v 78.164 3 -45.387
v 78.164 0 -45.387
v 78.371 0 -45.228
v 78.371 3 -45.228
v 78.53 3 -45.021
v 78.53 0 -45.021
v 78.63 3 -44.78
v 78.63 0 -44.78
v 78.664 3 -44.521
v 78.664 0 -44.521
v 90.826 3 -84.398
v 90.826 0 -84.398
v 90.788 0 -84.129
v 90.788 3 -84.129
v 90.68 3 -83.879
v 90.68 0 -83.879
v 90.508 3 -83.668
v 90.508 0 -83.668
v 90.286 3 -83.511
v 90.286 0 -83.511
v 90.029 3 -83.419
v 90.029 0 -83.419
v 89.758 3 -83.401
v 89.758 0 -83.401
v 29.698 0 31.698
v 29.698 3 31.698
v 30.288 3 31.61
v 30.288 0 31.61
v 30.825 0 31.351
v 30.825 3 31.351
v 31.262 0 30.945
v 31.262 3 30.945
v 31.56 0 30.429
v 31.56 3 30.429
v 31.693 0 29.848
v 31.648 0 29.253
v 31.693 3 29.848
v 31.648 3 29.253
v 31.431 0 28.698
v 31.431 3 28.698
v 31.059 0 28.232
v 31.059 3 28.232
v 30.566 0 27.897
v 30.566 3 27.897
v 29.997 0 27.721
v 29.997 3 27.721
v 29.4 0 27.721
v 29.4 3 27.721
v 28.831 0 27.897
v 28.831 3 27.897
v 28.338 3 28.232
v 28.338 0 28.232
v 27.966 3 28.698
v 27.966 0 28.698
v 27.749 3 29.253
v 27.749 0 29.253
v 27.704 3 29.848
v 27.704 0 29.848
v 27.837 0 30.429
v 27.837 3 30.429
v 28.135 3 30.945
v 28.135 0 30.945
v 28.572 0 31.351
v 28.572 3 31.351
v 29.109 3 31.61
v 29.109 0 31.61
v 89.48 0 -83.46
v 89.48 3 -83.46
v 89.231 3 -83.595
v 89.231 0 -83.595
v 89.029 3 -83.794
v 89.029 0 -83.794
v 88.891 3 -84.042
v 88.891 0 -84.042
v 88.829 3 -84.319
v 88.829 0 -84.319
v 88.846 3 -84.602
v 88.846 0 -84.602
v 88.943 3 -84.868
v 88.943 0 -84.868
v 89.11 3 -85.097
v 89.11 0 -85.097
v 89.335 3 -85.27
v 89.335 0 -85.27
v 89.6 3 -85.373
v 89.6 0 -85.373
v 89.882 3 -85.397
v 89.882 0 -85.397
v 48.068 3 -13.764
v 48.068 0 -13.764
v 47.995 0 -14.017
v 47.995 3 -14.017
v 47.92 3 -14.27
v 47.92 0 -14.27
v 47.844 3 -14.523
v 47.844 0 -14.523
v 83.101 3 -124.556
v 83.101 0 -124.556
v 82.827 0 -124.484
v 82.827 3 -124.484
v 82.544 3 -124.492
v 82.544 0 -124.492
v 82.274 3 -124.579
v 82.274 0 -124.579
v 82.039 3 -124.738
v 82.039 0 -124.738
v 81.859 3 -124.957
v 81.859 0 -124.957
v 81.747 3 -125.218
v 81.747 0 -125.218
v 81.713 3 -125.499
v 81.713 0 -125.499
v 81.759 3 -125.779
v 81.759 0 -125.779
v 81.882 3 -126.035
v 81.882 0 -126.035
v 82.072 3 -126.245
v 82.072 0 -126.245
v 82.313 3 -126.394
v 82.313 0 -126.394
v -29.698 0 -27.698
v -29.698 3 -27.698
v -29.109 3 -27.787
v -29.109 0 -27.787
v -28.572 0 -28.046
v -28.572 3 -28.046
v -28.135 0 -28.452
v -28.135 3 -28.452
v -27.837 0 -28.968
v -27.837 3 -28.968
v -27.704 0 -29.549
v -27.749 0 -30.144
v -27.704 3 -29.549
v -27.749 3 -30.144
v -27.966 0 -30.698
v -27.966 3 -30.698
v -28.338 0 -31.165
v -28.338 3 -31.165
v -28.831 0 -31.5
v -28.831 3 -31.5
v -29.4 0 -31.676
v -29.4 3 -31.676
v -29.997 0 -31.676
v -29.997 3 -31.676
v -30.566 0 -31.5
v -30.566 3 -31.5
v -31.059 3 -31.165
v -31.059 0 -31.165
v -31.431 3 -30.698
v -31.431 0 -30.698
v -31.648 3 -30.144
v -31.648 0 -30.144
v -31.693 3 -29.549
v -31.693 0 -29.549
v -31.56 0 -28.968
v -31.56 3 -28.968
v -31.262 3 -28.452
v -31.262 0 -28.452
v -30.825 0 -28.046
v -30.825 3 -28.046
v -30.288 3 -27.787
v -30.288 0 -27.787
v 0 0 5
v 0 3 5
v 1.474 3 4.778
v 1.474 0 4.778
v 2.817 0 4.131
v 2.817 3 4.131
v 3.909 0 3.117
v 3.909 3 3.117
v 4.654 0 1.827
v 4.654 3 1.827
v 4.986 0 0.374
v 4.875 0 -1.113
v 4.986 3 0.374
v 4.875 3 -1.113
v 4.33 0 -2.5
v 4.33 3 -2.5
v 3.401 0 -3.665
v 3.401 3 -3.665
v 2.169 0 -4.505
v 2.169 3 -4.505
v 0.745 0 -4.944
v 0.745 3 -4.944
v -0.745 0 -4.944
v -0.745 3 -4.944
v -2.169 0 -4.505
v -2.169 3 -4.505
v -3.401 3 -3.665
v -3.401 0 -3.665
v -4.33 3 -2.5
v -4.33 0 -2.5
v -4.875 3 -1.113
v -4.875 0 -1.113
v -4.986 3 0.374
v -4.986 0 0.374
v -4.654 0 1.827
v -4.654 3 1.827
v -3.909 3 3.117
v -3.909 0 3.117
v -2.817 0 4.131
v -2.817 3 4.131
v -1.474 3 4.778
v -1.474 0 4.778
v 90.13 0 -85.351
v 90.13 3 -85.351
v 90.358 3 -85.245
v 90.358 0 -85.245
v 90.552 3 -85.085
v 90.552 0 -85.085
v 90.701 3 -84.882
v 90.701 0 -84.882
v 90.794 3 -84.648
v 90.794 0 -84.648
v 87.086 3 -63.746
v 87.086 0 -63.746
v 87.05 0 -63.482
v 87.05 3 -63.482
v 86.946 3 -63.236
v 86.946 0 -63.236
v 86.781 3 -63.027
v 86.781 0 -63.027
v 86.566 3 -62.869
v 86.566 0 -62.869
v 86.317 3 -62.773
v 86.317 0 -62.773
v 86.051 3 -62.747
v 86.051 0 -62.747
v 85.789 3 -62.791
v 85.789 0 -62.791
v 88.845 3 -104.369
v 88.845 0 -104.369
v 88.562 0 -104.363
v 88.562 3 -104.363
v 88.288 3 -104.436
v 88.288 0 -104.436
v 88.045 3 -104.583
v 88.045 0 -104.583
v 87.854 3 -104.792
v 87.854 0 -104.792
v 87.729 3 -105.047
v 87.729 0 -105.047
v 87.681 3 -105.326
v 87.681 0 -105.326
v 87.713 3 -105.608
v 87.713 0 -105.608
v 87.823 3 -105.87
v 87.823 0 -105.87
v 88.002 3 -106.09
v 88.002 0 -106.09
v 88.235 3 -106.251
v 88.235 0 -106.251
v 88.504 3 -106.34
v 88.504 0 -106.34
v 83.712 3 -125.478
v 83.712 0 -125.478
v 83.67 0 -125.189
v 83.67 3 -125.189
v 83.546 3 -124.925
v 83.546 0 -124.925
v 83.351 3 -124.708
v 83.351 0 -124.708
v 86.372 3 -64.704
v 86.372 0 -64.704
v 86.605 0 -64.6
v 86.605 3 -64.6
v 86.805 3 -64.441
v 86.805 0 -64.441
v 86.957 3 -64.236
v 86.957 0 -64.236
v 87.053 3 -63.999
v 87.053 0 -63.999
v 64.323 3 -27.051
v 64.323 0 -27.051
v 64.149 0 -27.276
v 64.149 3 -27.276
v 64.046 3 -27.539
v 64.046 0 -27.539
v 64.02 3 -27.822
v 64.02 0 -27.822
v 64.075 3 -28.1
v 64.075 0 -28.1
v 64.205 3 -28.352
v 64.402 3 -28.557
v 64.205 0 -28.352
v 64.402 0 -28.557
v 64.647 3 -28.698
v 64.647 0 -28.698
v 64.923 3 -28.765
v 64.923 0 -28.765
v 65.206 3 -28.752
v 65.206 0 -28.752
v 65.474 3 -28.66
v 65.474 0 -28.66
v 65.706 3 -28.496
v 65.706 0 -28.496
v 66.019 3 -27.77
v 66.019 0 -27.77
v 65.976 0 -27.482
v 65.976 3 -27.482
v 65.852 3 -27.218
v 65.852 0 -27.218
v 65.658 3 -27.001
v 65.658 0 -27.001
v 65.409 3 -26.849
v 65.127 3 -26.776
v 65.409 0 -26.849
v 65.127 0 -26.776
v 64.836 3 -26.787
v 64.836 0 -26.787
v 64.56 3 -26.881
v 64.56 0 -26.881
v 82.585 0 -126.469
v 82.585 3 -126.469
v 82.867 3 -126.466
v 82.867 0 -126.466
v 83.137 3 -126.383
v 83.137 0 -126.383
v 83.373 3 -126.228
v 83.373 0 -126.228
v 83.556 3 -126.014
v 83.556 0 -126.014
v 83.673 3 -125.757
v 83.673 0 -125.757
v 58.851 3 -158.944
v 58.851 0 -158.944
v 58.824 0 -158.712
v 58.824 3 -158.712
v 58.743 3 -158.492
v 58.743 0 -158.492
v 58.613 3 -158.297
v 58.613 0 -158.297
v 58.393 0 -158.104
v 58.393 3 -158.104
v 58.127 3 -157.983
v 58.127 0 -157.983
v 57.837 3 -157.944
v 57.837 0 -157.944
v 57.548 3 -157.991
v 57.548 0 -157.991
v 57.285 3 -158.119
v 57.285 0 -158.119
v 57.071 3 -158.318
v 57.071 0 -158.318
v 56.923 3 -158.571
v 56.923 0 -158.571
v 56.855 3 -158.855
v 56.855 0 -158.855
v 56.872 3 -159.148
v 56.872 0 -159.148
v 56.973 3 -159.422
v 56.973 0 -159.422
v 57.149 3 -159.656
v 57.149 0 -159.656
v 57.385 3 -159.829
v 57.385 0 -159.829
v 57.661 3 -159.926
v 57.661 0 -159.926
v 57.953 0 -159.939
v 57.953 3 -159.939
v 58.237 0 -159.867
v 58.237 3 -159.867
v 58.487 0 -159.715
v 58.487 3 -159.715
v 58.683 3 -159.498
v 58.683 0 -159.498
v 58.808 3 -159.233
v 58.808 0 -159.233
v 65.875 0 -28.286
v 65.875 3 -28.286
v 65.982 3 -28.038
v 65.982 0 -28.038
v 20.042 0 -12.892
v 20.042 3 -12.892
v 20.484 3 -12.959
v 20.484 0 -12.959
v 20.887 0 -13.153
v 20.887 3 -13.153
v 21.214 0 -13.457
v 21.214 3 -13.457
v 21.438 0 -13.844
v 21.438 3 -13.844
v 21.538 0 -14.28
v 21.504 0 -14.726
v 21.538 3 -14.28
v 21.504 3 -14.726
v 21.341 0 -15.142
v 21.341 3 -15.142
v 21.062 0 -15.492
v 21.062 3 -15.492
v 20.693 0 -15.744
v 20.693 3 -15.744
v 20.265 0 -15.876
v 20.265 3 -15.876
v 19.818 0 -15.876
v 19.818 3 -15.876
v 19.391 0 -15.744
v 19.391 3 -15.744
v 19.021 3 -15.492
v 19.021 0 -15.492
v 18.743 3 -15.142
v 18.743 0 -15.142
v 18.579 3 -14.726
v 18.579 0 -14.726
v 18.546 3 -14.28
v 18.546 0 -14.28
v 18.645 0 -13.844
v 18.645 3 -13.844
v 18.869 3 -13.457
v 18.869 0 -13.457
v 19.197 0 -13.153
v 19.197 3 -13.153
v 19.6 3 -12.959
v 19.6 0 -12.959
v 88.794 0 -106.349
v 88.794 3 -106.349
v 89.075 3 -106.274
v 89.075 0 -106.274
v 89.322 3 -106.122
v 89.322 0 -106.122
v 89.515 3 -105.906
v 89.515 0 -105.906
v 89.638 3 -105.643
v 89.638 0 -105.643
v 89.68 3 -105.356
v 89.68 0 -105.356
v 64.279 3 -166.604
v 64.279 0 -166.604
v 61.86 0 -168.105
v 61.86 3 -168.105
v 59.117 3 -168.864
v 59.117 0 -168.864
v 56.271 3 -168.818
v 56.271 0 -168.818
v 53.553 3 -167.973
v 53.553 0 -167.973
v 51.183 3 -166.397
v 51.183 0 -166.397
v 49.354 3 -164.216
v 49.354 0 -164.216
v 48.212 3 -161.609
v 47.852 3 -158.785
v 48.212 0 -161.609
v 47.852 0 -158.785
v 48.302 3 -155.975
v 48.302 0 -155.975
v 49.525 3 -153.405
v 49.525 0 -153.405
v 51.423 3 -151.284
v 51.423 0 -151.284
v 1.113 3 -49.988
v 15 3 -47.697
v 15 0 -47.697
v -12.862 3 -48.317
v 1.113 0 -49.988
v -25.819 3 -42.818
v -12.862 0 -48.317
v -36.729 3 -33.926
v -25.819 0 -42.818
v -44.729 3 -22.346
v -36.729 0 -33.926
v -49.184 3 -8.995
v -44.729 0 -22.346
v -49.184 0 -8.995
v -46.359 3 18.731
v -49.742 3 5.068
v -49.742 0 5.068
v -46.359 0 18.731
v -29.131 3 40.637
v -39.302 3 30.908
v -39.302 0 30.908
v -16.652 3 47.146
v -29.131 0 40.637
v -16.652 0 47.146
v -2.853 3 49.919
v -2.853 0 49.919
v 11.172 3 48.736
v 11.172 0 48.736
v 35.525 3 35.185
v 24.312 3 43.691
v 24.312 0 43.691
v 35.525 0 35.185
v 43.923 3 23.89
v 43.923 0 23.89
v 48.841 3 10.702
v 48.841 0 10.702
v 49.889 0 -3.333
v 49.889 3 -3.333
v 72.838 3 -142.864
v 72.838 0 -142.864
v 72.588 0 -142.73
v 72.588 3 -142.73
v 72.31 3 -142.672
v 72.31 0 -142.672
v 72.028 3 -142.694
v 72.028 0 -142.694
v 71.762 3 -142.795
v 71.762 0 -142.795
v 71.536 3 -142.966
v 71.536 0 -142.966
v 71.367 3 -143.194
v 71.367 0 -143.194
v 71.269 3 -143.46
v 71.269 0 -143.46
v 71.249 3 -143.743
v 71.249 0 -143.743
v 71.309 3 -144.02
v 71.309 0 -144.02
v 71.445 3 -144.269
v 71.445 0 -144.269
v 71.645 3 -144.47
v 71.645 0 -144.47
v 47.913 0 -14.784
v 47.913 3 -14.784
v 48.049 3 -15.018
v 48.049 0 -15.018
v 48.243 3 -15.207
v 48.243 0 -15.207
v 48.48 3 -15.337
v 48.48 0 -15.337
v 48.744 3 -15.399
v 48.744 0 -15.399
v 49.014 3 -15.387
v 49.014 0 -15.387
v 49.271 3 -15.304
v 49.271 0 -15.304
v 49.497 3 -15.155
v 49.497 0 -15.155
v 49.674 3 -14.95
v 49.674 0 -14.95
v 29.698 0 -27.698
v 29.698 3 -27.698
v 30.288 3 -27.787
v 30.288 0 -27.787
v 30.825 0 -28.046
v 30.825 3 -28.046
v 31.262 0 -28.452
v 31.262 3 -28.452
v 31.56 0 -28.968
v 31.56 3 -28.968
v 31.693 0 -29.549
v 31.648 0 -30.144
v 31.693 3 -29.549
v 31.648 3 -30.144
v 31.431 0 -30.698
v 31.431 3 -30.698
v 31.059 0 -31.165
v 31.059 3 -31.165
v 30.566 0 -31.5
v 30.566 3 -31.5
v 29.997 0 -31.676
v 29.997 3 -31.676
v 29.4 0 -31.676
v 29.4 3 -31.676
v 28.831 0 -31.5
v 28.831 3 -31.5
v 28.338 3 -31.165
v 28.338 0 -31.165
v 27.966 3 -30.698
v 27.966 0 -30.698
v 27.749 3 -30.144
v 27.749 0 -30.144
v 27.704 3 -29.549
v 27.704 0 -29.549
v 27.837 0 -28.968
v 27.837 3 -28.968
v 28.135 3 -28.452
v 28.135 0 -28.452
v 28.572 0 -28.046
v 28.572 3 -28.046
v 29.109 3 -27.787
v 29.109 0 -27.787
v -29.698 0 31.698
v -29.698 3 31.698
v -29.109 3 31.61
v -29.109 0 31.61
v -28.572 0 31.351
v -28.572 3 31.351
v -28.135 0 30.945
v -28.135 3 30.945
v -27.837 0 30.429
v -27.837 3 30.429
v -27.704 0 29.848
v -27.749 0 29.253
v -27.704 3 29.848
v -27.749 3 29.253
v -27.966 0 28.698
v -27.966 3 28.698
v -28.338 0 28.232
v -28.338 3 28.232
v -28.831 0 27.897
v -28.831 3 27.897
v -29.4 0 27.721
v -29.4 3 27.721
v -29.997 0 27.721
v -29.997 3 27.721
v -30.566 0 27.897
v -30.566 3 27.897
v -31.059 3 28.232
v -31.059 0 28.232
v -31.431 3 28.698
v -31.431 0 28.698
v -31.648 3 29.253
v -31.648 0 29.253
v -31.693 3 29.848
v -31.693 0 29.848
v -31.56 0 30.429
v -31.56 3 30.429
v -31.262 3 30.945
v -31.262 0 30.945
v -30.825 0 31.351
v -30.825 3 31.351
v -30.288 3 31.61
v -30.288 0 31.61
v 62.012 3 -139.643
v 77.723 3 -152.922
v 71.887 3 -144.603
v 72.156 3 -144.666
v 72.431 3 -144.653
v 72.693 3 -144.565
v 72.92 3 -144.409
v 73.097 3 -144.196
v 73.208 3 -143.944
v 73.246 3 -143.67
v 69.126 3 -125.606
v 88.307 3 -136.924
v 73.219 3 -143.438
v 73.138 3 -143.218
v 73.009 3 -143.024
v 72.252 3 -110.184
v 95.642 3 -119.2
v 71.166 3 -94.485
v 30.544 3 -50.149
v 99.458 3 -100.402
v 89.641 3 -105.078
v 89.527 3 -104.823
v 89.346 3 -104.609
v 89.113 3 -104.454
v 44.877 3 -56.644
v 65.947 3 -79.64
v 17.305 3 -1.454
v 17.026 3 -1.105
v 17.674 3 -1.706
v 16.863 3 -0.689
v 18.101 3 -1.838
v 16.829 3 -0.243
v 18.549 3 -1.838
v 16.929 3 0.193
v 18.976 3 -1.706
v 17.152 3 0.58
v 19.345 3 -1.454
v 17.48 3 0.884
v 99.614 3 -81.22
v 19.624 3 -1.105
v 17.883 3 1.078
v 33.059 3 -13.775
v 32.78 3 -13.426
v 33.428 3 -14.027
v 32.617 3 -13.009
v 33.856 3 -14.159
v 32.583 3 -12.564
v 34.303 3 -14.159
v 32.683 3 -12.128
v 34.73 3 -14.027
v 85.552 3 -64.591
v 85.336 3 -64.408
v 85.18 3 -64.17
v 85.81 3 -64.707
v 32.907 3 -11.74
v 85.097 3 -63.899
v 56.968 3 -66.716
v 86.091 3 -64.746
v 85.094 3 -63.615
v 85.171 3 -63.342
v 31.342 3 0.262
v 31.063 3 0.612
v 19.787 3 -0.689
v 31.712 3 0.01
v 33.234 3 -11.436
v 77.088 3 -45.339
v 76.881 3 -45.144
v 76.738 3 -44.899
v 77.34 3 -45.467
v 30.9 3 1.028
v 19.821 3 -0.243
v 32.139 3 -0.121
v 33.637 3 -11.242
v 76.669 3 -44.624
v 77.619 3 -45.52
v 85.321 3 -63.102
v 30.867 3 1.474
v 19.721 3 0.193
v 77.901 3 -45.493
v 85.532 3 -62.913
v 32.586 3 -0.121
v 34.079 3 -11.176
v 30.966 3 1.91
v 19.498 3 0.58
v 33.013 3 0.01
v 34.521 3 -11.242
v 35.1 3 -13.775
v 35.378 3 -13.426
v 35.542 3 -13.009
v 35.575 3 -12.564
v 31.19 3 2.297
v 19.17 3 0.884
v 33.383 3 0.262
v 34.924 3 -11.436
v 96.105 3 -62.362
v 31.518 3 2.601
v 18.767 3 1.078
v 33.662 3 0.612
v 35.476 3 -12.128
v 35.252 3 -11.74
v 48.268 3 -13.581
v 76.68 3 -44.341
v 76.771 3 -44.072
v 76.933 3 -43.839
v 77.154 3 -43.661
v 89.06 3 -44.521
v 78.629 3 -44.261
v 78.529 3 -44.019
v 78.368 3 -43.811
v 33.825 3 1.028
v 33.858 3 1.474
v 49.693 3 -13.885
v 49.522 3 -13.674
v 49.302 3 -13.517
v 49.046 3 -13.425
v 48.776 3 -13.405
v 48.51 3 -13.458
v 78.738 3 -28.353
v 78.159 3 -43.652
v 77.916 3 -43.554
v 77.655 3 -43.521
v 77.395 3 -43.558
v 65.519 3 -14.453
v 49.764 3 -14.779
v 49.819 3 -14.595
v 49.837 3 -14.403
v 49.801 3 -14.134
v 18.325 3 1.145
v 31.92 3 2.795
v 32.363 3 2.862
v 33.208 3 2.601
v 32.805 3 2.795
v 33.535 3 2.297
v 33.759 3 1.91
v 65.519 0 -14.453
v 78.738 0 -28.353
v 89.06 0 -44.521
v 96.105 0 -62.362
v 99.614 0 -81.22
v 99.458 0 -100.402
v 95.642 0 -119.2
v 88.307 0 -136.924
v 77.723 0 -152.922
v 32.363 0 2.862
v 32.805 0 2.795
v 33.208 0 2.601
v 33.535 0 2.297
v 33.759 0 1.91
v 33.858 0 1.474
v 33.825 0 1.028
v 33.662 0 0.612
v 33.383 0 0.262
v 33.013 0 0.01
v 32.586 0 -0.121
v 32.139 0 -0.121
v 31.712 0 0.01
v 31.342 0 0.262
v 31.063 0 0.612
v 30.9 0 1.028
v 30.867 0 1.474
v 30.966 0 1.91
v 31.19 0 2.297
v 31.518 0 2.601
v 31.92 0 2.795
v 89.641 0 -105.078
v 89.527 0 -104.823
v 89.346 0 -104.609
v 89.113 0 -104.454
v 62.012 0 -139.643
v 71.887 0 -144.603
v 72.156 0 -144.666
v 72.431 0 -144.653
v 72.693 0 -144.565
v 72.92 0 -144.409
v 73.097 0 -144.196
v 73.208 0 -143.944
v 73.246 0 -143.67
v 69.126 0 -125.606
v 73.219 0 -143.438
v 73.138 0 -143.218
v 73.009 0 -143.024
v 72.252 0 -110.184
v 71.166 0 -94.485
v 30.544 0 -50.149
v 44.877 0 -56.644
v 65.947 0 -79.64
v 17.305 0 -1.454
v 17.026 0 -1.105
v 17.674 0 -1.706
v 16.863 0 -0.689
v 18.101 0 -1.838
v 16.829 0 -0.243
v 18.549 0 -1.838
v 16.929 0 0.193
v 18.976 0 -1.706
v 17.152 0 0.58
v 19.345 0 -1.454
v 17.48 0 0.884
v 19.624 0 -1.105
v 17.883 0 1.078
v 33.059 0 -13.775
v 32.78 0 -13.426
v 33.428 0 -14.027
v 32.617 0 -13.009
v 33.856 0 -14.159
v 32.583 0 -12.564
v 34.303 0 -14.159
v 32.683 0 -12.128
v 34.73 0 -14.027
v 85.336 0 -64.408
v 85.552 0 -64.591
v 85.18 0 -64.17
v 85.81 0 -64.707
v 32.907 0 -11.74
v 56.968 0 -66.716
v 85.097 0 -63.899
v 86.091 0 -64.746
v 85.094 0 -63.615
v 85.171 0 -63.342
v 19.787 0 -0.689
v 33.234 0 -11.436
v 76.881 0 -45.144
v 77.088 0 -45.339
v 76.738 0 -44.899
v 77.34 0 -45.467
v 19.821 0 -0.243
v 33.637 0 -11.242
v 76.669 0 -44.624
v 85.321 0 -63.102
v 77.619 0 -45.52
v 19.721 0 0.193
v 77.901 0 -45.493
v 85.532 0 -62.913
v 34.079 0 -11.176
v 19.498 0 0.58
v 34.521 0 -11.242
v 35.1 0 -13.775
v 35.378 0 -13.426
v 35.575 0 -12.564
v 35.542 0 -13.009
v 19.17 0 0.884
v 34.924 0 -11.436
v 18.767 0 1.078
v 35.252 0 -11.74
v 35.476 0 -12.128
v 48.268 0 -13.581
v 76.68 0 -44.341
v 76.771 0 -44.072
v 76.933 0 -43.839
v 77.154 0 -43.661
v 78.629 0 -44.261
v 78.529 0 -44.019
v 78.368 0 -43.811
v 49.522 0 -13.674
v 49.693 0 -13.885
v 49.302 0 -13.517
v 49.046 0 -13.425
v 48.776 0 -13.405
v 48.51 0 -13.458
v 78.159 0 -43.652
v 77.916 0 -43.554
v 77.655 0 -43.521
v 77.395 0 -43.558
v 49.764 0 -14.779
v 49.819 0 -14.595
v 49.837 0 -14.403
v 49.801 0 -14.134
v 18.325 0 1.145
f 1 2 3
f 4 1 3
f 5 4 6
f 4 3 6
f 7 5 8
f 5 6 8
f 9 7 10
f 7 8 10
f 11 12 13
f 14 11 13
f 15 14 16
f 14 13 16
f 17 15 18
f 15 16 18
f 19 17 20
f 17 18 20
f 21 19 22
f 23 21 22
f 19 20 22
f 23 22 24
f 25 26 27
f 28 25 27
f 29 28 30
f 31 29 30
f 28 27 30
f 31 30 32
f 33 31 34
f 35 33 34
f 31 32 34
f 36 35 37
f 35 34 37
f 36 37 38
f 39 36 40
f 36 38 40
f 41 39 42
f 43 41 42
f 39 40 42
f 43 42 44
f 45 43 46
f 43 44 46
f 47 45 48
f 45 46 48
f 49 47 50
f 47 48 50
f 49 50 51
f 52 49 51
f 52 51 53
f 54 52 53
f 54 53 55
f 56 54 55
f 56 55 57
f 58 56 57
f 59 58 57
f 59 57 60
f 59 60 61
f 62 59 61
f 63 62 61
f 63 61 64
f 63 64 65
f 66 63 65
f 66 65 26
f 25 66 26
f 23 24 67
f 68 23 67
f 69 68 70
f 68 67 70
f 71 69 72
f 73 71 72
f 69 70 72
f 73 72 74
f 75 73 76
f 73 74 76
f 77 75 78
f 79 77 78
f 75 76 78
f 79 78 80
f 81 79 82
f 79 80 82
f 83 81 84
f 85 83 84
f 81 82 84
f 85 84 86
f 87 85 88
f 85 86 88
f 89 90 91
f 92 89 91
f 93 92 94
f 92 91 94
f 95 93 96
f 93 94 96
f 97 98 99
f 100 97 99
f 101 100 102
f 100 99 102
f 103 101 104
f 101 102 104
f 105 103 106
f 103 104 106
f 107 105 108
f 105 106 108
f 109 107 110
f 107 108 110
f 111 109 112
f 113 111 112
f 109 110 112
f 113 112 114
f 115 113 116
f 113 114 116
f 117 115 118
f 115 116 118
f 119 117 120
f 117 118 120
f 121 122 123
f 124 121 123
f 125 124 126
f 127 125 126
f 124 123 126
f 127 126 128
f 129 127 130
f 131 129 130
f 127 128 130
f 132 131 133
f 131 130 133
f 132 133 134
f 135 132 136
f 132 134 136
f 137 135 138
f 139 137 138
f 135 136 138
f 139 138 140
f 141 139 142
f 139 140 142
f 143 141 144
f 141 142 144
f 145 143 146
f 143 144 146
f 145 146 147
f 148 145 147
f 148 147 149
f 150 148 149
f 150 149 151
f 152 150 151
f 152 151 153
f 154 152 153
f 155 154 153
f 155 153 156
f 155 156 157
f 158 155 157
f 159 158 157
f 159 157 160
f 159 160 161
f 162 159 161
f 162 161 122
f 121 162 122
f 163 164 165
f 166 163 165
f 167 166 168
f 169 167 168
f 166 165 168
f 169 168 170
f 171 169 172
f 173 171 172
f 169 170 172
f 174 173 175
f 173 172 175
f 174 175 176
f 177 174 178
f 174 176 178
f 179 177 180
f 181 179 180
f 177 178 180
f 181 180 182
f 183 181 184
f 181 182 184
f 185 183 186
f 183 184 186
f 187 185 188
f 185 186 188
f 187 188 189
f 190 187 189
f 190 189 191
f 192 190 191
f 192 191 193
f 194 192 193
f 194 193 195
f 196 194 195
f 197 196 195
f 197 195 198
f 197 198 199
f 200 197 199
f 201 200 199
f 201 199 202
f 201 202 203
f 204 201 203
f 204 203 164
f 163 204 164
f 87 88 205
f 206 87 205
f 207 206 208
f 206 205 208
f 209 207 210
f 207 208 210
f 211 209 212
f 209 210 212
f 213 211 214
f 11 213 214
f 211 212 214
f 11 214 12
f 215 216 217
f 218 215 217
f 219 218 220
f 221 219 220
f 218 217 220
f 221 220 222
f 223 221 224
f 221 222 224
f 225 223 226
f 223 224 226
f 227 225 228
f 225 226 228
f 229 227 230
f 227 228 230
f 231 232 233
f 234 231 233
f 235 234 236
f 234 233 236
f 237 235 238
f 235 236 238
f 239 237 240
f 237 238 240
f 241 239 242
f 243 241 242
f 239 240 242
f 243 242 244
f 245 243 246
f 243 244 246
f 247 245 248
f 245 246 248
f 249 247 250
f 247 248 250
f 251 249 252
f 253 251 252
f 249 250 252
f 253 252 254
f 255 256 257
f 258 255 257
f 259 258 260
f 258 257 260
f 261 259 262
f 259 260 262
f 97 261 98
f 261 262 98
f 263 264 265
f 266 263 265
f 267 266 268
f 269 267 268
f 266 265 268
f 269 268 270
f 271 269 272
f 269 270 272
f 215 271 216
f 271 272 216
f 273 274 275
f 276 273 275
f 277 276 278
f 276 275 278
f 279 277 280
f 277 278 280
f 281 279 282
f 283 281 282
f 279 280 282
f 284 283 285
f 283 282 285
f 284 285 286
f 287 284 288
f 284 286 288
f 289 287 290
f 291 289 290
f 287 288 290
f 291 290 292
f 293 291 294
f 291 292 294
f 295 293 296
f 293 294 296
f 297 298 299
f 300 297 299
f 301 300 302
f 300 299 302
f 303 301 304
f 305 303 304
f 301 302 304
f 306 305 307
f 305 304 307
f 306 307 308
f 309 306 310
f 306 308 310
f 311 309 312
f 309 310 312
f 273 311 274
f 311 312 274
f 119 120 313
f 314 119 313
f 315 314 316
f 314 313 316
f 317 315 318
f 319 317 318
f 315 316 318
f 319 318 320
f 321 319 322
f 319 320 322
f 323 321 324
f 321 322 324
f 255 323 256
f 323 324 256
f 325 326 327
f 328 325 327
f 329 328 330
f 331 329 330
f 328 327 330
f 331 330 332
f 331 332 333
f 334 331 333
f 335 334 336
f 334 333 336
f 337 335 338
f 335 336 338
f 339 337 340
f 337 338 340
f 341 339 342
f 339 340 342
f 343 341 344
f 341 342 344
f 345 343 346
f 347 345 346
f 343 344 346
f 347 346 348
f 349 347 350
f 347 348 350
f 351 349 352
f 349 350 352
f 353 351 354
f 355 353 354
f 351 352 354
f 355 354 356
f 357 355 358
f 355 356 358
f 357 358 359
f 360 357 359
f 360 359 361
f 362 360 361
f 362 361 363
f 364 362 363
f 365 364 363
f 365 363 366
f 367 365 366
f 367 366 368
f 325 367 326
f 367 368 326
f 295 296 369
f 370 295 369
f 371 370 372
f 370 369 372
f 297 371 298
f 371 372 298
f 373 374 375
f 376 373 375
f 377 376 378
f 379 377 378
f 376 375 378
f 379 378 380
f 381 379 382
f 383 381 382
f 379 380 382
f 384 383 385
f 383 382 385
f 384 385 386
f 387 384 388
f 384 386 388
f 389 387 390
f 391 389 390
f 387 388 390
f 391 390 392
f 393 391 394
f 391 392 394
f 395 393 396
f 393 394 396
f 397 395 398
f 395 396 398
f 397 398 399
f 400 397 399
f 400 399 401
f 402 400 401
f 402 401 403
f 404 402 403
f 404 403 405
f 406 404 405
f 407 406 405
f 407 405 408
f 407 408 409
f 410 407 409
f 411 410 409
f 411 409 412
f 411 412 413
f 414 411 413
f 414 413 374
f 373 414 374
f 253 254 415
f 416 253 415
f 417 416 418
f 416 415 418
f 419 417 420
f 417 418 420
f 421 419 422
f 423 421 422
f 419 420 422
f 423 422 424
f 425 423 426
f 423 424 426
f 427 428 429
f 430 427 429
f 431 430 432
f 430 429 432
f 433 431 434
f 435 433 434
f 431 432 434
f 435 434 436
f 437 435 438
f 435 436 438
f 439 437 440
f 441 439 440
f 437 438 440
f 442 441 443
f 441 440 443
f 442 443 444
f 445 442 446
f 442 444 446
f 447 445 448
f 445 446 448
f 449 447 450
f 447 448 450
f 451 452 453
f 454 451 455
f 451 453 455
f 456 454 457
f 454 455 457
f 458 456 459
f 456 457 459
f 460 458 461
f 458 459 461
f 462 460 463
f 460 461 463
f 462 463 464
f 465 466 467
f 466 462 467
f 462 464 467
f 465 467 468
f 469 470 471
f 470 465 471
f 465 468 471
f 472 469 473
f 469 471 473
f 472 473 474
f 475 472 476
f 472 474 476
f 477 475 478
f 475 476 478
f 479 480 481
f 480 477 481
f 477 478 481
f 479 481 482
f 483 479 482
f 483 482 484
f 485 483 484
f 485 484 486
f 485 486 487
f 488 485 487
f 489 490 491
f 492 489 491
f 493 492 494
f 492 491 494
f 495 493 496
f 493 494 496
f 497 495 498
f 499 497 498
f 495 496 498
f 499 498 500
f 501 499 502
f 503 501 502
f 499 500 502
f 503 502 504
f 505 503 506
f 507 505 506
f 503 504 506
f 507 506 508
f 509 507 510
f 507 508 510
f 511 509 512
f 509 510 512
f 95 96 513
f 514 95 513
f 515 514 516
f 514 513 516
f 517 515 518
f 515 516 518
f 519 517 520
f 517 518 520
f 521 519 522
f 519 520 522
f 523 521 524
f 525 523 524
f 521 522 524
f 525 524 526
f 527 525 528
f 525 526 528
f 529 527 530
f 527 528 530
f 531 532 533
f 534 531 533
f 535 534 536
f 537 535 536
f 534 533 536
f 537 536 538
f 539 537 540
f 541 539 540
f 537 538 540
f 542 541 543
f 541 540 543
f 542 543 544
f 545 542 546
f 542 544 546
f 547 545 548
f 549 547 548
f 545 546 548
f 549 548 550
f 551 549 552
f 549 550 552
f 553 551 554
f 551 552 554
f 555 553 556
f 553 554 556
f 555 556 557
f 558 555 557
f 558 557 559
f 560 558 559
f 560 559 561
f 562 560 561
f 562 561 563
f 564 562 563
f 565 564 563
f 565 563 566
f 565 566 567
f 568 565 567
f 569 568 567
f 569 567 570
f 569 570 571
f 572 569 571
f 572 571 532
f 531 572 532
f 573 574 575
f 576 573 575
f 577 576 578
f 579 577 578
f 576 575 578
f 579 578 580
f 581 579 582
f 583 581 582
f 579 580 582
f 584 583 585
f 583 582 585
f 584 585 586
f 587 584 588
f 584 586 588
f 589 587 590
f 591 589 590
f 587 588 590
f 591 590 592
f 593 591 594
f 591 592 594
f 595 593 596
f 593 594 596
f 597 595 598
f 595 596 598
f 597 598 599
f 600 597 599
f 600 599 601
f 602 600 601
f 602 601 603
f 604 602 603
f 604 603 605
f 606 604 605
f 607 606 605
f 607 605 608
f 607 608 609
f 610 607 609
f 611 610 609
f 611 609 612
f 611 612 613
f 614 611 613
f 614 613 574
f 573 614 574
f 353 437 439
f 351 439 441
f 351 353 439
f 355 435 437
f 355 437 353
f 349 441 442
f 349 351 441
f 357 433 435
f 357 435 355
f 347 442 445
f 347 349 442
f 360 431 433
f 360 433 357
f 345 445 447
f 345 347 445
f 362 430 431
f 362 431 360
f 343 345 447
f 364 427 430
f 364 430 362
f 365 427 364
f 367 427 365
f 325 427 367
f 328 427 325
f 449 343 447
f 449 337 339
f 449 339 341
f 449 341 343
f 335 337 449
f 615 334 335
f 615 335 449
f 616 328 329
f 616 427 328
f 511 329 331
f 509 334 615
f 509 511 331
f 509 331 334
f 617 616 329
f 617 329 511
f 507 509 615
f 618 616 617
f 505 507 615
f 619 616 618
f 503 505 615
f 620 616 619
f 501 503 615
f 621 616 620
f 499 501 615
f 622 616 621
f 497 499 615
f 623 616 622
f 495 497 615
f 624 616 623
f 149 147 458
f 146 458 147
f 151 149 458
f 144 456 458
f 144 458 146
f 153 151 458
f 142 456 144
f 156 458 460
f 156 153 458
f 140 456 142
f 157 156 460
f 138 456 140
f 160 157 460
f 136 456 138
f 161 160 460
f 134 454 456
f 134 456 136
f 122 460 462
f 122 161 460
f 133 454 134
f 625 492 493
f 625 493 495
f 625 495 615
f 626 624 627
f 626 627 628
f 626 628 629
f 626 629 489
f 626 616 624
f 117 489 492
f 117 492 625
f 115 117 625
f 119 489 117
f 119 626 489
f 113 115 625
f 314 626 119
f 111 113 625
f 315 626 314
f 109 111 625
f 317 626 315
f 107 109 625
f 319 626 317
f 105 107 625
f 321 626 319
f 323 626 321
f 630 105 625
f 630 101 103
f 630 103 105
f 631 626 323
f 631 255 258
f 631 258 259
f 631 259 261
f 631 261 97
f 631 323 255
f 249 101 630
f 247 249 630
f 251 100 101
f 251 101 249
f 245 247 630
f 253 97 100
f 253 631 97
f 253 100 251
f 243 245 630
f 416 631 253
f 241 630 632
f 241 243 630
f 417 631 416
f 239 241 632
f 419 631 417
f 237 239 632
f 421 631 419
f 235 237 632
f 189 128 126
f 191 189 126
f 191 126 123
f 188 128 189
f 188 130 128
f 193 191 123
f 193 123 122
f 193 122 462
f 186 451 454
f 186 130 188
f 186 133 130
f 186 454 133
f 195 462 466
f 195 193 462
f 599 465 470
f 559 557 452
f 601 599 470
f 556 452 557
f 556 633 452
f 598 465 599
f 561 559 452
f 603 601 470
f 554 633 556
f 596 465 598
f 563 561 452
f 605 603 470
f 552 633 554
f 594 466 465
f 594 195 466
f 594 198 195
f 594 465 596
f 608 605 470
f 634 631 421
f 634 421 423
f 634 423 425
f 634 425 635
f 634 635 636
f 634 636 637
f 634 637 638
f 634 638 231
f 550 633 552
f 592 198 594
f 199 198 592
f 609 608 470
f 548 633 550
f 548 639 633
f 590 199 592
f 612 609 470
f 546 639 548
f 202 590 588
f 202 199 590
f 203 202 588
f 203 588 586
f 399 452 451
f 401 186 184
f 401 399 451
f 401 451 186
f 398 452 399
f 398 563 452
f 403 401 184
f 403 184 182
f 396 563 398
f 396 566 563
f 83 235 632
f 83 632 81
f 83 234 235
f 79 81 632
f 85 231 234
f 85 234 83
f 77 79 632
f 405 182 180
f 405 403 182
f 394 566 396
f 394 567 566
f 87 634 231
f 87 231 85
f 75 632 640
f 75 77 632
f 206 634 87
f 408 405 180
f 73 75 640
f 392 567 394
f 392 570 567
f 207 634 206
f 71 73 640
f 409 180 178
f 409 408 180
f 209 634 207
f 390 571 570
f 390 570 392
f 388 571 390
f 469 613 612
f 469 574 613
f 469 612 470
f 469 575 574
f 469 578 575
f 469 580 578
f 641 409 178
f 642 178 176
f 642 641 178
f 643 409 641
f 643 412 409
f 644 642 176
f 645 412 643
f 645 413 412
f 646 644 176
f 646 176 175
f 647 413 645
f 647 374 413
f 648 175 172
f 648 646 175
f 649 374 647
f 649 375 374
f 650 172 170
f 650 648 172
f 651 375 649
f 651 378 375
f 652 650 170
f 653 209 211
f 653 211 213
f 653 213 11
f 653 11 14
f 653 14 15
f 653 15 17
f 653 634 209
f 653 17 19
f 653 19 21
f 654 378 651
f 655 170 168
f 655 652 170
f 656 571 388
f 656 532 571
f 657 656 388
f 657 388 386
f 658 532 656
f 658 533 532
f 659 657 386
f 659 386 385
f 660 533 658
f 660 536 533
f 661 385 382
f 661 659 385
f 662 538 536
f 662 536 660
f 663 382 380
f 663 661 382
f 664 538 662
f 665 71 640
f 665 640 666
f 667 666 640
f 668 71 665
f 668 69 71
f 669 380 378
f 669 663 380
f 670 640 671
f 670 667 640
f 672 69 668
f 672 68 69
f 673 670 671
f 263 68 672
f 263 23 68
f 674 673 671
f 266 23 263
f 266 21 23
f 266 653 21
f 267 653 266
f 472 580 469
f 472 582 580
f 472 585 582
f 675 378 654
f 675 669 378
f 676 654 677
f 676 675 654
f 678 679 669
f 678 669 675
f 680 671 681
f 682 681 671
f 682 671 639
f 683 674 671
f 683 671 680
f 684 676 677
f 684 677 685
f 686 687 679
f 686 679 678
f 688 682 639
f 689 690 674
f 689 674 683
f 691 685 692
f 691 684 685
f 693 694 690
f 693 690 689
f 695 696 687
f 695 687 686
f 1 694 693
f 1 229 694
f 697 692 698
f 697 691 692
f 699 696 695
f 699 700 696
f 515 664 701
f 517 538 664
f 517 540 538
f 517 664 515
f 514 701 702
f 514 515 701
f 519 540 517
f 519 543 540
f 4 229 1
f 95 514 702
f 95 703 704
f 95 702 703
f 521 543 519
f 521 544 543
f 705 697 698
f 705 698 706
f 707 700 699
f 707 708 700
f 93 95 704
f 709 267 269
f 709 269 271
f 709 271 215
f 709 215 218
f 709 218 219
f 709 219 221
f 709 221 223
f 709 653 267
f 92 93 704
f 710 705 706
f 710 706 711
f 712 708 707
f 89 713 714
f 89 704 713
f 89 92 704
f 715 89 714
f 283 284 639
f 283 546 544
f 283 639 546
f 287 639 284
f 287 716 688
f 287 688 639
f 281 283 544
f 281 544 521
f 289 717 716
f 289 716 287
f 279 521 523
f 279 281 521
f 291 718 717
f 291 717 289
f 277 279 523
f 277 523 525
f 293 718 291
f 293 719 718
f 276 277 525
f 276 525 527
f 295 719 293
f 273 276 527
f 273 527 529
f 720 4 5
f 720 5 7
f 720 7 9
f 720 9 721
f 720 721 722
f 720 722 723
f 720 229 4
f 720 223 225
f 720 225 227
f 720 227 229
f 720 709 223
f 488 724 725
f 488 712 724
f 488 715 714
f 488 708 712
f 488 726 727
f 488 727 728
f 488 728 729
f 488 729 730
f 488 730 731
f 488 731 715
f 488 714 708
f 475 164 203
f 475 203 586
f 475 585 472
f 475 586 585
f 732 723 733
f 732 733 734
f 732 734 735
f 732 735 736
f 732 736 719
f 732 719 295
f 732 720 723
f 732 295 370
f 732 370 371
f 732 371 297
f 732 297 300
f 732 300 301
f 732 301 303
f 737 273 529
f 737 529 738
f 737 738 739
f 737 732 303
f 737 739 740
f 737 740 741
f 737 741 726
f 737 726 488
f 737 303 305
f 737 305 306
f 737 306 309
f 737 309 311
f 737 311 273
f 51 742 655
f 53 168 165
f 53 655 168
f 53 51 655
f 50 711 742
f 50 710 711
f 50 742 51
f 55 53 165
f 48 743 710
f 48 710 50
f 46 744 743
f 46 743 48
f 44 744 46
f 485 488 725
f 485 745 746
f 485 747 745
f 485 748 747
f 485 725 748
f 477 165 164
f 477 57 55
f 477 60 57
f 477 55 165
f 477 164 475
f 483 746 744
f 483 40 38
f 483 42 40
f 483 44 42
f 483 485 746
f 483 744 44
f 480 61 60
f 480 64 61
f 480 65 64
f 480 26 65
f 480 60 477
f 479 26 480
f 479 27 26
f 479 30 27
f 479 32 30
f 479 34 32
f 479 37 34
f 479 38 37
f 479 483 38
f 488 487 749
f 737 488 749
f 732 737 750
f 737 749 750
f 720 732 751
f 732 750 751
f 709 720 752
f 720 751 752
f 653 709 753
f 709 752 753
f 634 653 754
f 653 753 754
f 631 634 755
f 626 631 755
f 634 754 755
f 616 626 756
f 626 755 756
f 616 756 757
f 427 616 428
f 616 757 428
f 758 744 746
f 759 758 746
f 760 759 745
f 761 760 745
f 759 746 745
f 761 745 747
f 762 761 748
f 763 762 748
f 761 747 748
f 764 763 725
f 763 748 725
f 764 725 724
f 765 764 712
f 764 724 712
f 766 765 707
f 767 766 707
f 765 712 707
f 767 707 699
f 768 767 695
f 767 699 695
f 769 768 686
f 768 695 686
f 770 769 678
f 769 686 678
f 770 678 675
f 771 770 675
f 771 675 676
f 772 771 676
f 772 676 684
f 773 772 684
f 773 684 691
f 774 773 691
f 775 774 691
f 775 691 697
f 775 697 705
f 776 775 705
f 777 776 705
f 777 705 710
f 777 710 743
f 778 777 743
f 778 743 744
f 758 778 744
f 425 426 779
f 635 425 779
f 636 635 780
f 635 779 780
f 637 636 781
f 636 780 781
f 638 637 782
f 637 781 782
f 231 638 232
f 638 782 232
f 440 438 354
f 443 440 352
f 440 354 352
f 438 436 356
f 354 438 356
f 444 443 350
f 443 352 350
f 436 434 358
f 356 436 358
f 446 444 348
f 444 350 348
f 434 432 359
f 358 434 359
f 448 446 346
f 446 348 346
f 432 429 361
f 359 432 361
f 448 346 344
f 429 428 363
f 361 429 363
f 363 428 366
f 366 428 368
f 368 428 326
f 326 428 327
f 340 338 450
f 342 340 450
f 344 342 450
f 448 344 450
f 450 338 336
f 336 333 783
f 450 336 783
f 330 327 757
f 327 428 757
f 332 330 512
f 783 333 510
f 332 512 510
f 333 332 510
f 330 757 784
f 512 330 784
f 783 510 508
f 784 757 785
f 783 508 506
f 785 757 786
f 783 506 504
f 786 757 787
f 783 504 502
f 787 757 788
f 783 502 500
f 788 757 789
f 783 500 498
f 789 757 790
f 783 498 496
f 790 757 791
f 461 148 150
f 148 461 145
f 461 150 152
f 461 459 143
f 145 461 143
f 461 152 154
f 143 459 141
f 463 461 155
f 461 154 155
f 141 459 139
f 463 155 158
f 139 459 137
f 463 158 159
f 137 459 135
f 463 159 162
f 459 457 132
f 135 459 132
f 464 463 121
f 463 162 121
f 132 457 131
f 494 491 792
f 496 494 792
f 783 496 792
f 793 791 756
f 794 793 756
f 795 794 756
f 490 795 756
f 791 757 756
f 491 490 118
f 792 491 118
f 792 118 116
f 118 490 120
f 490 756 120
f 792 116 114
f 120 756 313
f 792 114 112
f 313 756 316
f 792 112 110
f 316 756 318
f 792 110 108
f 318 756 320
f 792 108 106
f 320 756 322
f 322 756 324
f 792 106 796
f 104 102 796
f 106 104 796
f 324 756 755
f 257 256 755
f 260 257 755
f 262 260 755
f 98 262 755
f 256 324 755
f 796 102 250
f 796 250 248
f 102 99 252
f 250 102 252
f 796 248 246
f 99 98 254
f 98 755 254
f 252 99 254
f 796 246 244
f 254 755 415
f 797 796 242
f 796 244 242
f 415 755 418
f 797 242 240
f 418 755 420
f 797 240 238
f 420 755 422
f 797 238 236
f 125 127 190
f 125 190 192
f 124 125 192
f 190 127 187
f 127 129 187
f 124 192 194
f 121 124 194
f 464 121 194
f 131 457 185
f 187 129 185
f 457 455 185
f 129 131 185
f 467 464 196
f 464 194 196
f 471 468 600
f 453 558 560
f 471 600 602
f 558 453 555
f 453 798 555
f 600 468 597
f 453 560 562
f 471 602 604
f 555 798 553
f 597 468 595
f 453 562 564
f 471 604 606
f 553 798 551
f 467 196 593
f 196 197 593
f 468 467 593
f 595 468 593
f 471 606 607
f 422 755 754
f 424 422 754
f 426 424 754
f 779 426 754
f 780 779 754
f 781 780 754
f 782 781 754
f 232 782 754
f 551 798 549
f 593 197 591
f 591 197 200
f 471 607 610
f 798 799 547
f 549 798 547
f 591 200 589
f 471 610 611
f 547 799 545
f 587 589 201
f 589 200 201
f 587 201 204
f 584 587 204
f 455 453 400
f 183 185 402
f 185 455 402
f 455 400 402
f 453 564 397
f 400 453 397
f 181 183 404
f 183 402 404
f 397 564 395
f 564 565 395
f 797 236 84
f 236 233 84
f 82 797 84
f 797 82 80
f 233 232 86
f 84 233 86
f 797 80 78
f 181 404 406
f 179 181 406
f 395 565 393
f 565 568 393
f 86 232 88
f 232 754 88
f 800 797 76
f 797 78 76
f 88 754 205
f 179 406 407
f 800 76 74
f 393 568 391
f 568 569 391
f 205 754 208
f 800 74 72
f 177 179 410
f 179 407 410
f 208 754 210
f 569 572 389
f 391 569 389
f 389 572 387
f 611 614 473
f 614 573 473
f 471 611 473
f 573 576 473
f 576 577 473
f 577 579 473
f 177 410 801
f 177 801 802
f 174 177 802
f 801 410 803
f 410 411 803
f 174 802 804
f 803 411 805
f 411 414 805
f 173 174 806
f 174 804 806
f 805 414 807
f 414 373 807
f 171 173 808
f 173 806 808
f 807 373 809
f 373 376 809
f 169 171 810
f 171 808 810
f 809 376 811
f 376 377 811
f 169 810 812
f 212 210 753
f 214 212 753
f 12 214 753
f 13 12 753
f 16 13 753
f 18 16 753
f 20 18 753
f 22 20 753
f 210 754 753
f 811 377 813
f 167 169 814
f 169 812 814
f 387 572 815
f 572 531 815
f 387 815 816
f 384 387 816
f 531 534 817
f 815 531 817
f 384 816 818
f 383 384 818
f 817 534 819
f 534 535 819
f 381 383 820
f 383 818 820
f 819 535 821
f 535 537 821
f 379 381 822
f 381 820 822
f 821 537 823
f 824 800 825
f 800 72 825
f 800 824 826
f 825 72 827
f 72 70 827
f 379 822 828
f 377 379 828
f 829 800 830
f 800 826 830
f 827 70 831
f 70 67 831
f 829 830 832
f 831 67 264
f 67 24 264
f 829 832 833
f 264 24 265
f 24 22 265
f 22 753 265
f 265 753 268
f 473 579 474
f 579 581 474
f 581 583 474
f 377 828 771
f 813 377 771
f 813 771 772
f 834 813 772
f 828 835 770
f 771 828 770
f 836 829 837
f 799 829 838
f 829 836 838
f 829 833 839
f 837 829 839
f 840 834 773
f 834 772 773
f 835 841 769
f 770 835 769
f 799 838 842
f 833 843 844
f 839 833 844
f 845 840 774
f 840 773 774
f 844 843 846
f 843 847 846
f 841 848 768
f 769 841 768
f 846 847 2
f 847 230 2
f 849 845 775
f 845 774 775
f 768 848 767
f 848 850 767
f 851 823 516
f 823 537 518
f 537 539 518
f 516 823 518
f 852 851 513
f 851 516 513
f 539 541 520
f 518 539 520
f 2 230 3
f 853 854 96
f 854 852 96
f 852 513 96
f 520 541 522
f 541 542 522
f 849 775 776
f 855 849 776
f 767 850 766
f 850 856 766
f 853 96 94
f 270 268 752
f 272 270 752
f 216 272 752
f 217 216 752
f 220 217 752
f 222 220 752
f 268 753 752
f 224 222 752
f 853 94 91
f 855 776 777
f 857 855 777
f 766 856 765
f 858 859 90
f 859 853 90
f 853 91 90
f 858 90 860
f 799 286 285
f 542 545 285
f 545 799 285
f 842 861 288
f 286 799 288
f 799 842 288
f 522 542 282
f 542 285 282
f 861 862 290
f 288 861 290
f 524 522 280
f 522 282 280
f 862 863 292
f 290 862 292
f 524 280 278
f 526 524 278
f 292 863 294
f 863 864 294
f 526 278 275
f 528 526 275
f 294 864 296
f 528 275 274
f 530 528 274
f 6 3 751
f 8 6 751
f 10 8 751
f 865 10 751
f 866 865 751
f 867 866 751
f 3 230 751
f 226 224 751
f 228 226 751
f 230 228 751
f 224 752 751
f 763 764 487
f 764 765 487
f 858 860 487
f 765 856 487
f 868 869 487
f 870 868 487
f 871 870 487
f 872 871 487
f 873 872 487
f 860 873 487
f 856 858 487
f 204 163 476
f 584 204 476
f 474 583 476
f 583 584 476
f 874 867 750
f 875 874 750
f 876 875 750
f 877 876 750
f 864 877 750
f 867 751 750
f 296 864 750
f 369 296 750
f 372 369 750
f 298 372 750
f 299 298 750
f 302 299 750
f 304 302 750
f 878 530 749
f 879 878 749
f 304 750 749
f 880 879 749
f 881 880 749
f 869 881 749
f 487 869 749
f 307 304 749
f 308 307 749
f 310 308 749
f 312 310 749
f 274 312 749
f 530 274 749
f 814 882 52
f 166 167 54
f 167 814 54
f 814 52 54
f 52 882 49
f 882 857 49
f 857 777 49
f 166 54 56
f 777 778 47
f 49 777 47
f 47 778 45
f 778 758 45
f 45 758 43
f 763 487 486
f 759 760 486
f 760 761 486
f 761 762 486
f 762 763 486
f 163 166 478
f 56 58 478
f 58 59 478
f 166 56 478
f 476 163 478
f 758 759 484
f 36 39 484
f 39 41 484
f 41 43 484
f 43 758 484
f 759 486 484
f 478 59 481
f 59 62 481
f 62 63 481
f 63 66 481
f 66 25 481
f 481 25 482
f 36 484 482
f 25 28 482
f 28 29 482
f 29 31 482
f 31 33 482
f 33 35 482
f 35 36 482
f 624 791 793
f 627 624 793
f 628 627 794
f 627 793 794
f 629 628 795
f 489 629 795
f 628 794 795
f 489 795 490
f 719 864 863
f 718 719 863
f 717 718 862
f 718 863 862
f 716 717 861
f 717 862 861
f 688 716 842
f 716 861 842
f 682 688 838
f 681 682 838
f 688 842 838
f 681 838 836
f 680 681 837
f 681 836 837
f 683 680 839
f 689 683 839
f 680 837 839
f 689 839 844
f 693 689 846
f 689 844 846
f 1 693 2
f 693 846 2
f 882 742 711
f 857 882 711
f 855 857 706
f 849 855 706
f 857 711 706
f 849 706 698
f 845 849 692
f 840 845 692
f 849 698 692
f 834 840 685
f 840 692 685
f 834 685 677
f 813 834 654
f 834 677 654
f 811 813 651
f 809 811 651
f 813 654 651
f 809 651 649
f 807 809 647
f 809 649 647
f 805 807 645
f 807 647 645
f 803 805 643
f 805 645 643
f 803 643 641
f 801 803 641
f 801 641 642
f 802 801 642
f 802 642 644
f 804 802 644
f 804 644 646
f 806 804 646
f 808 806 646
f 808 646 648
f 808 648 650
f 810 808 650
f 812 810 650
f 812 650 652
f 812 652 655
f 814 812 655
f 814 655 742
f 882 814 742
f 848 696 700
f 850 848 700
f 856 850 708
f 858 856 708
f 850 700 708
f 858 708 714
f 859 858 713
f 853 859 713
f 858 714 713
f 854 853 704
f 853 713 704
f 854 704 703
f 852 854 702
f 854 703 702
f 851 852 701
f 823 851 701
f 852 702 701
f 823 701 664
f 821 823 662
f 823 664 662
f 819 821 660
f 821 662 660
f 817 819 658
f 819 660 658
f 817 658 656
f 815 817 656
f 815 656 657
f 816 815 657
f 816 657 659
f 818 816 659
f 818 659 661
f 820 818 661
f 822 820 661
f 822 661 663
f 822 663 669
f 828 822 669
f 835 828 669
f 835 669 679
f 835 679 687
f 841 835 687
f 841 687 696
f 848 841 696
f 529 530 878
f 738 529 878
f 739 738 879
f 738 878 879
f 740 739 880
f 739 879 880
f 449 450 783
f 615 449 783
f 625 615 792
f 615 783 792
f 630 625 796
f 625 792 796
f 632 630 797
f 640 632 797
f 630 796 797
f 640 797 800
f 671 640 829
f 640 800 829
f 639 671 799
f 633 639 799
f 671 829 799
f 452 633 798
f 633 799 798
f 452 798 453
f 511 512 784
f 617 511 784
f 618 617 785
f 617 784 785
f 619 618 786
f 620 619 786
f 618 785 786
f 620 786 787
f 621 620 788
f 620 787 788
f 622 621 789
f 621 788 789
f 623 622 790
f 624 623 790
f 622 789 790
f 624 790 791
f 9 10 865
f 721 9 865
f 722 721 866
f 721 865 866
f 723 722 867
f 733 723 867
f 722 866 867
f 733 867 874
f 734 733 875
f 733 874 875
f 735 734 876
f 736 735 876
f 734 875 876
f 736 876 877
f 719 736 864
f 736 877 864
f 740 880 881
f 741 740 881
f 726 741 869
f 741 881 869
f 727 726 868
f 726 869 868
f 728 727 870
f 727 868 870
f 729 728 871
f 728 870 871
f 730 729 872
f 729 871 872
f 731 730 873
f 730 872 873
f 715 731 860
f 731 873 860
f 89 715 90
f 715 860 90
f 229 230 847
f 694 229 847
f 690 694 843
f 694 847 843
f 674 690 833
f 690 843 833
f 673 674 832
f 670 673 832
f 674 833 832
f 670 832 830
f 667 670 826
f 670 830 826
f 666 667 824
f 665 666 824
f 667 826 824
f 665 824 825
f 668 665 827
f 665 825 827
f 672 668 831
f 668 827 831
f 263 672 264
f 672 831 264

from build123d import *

# Parameters (mm, degrees)
IZIM1_R               = 50
TOP_COVER_DEPTH       = 3
IZIM2_R               = 2
SPACER_DELIKLER_DEPTH = 71.774289117
IZIM4_R               = 5
KES_EKSTR_ZYON3_DEPTH = 71.774289117
IZIM4_3_R             = 1.5
KES_EKSTR_ZYON4_DEPTH = 71.774289117
KANCA_START           = -3
KANCA_DELIKLERI_DEPTH = 3


with BuildPart() as part:
    # Çizim1 → top cover (new body)
    with BuildSketch(Plane(origin=(0, 0, 0), x_dir=(1, 0, 0), z_dir=(0, 1, 0))):
        Circle(IZIM1_R)
    extrude(amount=TOP_COVER_DEPTH)

    # Çizim2 → spacer delikler (cut, through all)
    with BuildSketch(Plane(origin=(0, 3, 0), x_dir=(1, 0, 0), z_dir=(0, 1, 0))):
        with Locations((-29.69848481, 29.69848481)):
            Circle(IZIM2_R)
        with Locations((29.69848481, 29.69848481)):
            Circle(IZIM2_R)
        with Locations((29.69848481, -29.69848481)):
            Circle(IZIM2_R)
        with Locations((-29.69848481, -29.69848481)):
            Circle(IZIM2_R)
    extrude(amount=-SPACER_DELIKLER_DEPTH, mode=Mode.SUBTRACT)

    # Çizim4 → Kes-Ekstrüzyon3 (cut, through all)
    with BuildSketch(Plane(origin=(0, 3, 0), x_dir=(1, 0, 0), z_dir=(0, 1, 0))):
        Circle(IZIM4_R)
    extrude(amount=-KES_EKSTR_ZYON3_DEPTH, mode=Mode.SUBTRACT)

    # Çizim4<3> → Kes-Ekstrüzyon4 (cut, through all)
    with BuildSketch(Plane(origin=(0, 3, 0), x_dir=(1, 0, 0), z_dir=(0, 1, 0))):
        with Locations((34.079267821, 12.675680455)):
            Circle(IZIM4_3_R)
        with Locations((32.362523879, -1.361868841)):
            Circle(IZIM4_3_R)
        with Locations((18.324974583, 0.354875101)):
            Circle(IZIM4_3_R)
        with Locations((20.041718525, 14.392424397)):
            Circle(IZIM4_3_R)
    extrude(amount=-KES_EKSTR_ZYON4_DEPTH, mode=Mode.SUBTRACT)

    # Çizim3 → kanca delikleri (add)
    with BuildSketch(Plane(origin=(0, 3, 0), x_dir=(1, 0, 0), z_dir=(0, 1, 0)).offset(KANCA_START)):
        with BuildLine():
            ThreePointArc((48.06829925, 13.763669832), (49.2554017, 8.596825189), (49.888765157, 3.333333333))
            ThreePointArc((49.888765157, 3.333333333), (99.613854084, 81.220474128), (64.278760969, 166.604444312))
            ThreePointArc((64.278760969, 166.604444312), (50.190440441, 165.371875978), (51.423008775, 151.28355545))
            ThreePointArc((51.423008775, 151.28355545), (69.056591634, 86.88644621), (15, 47.696960071))
            ThreePointArc((15, 47.696960071), (35.531564272, 35.178231058), (47.844482908, 14.522584318))
            ThreePointArc((47.844482908, 14.522584318), (48.609720304, 15.376680878), (49.674237351, 14.950215566))
            ThreePointArc((49.674237351, 14.950215566), (49.795665804, 14.688455458), (49.837297416, 14.402920816))
            ThreePointArc((49.837297416, 14.402920816), (49.177151674, 13.462442702), (48.06829925, 13.763669832))
        make_face()
        with BuildLine():
            ThreePointArc((66.018615213, 27.769945559), (65.40884087, 26.849226309), (64.32316734, 27.051369011))
            ThreePointArc((64.32316734, 27.051369011), (64.296186155, 28.461390608), (65.706036097, 28.496204829))
            ThreePointArc((65.706036097, 28.496204829), (65.937152334, 28.1652803), (66.018615213, 27.769945559))
        make_face(mode=Mode.SUBTRACT)
        with BuildLine():
            ThreePointArc((78.663944618, 44.521304918), (78.158866275, 43.652367317), (77.153839511, 43.661192844))
            ThreePointArc((77.153839511, 43.661192844), (76.8010119, 45.026623752), (78.164461583, 45.387031646))
            ThreePointArc((78.164461583, 45.387031646), (78.530119244, 45.021046368), (78.663944618, 44.521304918))
        make_face(mode=Mode.SUBTRACT)
        with BuildLine():
            ThreePointArc((87.08557892, 63.745988838), (86.678444563, 62.940687448), (85.788558261, 62.791117785))
            ThreePointArc((85.788558261, 62.791117785), (85.129072487, 64.037700073), (86.371971728, 64.704101127))
            ThreePointArc((86.371971728, 64.704101127), (86.887574184, 64.343319229), (87.08557892, 63.745988838))
        make_face(mode=Mode.SUBTRACT)
        with BuildLine():
            ThreePointArc((90.825513882, 84.398477371), (90.508235288, 83.667798589), (89.757730918, 83.400777281))
            ThreePointArc((89.757730918, 83.400777281), (88.827452617, 84.460716511), (89.882207277, 85.396869007))
            ThreePointArc((89.882207277, 85.396869007), (90.552388492, 85.085247567), (90.825513882, 84.398477371))
        make_face(mode=Mode.SUBTRACT)
        with BuildLine():
            ThreePointArc((89.680355962, 105.355600491), (89.443619041, 104.70951267), (88.845497016, 104.369330532))
            ThreePointArc((88.845497016, 104.369330532), (87.695018674, 105.184982708), (88.504266716, 106.339974697))
            ThreePointArc((88.504266716, 106.339974697), (89.322193462, 106.122441168), (89.680355962, 105.355600491))
        make_face(mode=Mode.SUBTRACT)
        with BuildLine():
            ThreePointArc((58.850884872, 158.943999881), (58.789623808, 158.59937079), (58.613346451, 158.296966388))
            ThreePointArc((58.613346451, 158.296966388), (56.912145936, 159.288628972), (58.850884872, 158.943999881))
        make_face(mode=Mode.SUBTRACT)
        with BuildLine():
            ThreePointArc((83.712383709, 125.47762085), (83.545775574, 124.924938302), (83.10146771, 124.556418571))
            ThreePointArc((83.10146771, 124.556418571), (81.793357223, 125.083425063), (82.313088302, 126.394443177))
            ThreePointArc((82.313088302, 126.394443177), (83.260427773, 126.314070313), (83.712383709, 125.47762085))
        make_face(mode=Mode.SUBTRACT)
        with BuildLine():
            ThreePointArc((73.246160797, 143.670217534), (73.138311823, 143.218480281), (72.838027705, 142.864181825))
            ThreePointArc((72.838027705, 142.864181825), (71.443425677, 143.073881783), (71.64537461, 144.469627289))
            ThreePointArc((71.64537461, 144.469627289), (72.692934684, 144.564864444), (73.246160797, 143.670217534))
        make_face(mode=Mode.SUBTRACT)
    extrude(amount=KANCA_DELIKLERI_DEPTH)


solid = part.part
